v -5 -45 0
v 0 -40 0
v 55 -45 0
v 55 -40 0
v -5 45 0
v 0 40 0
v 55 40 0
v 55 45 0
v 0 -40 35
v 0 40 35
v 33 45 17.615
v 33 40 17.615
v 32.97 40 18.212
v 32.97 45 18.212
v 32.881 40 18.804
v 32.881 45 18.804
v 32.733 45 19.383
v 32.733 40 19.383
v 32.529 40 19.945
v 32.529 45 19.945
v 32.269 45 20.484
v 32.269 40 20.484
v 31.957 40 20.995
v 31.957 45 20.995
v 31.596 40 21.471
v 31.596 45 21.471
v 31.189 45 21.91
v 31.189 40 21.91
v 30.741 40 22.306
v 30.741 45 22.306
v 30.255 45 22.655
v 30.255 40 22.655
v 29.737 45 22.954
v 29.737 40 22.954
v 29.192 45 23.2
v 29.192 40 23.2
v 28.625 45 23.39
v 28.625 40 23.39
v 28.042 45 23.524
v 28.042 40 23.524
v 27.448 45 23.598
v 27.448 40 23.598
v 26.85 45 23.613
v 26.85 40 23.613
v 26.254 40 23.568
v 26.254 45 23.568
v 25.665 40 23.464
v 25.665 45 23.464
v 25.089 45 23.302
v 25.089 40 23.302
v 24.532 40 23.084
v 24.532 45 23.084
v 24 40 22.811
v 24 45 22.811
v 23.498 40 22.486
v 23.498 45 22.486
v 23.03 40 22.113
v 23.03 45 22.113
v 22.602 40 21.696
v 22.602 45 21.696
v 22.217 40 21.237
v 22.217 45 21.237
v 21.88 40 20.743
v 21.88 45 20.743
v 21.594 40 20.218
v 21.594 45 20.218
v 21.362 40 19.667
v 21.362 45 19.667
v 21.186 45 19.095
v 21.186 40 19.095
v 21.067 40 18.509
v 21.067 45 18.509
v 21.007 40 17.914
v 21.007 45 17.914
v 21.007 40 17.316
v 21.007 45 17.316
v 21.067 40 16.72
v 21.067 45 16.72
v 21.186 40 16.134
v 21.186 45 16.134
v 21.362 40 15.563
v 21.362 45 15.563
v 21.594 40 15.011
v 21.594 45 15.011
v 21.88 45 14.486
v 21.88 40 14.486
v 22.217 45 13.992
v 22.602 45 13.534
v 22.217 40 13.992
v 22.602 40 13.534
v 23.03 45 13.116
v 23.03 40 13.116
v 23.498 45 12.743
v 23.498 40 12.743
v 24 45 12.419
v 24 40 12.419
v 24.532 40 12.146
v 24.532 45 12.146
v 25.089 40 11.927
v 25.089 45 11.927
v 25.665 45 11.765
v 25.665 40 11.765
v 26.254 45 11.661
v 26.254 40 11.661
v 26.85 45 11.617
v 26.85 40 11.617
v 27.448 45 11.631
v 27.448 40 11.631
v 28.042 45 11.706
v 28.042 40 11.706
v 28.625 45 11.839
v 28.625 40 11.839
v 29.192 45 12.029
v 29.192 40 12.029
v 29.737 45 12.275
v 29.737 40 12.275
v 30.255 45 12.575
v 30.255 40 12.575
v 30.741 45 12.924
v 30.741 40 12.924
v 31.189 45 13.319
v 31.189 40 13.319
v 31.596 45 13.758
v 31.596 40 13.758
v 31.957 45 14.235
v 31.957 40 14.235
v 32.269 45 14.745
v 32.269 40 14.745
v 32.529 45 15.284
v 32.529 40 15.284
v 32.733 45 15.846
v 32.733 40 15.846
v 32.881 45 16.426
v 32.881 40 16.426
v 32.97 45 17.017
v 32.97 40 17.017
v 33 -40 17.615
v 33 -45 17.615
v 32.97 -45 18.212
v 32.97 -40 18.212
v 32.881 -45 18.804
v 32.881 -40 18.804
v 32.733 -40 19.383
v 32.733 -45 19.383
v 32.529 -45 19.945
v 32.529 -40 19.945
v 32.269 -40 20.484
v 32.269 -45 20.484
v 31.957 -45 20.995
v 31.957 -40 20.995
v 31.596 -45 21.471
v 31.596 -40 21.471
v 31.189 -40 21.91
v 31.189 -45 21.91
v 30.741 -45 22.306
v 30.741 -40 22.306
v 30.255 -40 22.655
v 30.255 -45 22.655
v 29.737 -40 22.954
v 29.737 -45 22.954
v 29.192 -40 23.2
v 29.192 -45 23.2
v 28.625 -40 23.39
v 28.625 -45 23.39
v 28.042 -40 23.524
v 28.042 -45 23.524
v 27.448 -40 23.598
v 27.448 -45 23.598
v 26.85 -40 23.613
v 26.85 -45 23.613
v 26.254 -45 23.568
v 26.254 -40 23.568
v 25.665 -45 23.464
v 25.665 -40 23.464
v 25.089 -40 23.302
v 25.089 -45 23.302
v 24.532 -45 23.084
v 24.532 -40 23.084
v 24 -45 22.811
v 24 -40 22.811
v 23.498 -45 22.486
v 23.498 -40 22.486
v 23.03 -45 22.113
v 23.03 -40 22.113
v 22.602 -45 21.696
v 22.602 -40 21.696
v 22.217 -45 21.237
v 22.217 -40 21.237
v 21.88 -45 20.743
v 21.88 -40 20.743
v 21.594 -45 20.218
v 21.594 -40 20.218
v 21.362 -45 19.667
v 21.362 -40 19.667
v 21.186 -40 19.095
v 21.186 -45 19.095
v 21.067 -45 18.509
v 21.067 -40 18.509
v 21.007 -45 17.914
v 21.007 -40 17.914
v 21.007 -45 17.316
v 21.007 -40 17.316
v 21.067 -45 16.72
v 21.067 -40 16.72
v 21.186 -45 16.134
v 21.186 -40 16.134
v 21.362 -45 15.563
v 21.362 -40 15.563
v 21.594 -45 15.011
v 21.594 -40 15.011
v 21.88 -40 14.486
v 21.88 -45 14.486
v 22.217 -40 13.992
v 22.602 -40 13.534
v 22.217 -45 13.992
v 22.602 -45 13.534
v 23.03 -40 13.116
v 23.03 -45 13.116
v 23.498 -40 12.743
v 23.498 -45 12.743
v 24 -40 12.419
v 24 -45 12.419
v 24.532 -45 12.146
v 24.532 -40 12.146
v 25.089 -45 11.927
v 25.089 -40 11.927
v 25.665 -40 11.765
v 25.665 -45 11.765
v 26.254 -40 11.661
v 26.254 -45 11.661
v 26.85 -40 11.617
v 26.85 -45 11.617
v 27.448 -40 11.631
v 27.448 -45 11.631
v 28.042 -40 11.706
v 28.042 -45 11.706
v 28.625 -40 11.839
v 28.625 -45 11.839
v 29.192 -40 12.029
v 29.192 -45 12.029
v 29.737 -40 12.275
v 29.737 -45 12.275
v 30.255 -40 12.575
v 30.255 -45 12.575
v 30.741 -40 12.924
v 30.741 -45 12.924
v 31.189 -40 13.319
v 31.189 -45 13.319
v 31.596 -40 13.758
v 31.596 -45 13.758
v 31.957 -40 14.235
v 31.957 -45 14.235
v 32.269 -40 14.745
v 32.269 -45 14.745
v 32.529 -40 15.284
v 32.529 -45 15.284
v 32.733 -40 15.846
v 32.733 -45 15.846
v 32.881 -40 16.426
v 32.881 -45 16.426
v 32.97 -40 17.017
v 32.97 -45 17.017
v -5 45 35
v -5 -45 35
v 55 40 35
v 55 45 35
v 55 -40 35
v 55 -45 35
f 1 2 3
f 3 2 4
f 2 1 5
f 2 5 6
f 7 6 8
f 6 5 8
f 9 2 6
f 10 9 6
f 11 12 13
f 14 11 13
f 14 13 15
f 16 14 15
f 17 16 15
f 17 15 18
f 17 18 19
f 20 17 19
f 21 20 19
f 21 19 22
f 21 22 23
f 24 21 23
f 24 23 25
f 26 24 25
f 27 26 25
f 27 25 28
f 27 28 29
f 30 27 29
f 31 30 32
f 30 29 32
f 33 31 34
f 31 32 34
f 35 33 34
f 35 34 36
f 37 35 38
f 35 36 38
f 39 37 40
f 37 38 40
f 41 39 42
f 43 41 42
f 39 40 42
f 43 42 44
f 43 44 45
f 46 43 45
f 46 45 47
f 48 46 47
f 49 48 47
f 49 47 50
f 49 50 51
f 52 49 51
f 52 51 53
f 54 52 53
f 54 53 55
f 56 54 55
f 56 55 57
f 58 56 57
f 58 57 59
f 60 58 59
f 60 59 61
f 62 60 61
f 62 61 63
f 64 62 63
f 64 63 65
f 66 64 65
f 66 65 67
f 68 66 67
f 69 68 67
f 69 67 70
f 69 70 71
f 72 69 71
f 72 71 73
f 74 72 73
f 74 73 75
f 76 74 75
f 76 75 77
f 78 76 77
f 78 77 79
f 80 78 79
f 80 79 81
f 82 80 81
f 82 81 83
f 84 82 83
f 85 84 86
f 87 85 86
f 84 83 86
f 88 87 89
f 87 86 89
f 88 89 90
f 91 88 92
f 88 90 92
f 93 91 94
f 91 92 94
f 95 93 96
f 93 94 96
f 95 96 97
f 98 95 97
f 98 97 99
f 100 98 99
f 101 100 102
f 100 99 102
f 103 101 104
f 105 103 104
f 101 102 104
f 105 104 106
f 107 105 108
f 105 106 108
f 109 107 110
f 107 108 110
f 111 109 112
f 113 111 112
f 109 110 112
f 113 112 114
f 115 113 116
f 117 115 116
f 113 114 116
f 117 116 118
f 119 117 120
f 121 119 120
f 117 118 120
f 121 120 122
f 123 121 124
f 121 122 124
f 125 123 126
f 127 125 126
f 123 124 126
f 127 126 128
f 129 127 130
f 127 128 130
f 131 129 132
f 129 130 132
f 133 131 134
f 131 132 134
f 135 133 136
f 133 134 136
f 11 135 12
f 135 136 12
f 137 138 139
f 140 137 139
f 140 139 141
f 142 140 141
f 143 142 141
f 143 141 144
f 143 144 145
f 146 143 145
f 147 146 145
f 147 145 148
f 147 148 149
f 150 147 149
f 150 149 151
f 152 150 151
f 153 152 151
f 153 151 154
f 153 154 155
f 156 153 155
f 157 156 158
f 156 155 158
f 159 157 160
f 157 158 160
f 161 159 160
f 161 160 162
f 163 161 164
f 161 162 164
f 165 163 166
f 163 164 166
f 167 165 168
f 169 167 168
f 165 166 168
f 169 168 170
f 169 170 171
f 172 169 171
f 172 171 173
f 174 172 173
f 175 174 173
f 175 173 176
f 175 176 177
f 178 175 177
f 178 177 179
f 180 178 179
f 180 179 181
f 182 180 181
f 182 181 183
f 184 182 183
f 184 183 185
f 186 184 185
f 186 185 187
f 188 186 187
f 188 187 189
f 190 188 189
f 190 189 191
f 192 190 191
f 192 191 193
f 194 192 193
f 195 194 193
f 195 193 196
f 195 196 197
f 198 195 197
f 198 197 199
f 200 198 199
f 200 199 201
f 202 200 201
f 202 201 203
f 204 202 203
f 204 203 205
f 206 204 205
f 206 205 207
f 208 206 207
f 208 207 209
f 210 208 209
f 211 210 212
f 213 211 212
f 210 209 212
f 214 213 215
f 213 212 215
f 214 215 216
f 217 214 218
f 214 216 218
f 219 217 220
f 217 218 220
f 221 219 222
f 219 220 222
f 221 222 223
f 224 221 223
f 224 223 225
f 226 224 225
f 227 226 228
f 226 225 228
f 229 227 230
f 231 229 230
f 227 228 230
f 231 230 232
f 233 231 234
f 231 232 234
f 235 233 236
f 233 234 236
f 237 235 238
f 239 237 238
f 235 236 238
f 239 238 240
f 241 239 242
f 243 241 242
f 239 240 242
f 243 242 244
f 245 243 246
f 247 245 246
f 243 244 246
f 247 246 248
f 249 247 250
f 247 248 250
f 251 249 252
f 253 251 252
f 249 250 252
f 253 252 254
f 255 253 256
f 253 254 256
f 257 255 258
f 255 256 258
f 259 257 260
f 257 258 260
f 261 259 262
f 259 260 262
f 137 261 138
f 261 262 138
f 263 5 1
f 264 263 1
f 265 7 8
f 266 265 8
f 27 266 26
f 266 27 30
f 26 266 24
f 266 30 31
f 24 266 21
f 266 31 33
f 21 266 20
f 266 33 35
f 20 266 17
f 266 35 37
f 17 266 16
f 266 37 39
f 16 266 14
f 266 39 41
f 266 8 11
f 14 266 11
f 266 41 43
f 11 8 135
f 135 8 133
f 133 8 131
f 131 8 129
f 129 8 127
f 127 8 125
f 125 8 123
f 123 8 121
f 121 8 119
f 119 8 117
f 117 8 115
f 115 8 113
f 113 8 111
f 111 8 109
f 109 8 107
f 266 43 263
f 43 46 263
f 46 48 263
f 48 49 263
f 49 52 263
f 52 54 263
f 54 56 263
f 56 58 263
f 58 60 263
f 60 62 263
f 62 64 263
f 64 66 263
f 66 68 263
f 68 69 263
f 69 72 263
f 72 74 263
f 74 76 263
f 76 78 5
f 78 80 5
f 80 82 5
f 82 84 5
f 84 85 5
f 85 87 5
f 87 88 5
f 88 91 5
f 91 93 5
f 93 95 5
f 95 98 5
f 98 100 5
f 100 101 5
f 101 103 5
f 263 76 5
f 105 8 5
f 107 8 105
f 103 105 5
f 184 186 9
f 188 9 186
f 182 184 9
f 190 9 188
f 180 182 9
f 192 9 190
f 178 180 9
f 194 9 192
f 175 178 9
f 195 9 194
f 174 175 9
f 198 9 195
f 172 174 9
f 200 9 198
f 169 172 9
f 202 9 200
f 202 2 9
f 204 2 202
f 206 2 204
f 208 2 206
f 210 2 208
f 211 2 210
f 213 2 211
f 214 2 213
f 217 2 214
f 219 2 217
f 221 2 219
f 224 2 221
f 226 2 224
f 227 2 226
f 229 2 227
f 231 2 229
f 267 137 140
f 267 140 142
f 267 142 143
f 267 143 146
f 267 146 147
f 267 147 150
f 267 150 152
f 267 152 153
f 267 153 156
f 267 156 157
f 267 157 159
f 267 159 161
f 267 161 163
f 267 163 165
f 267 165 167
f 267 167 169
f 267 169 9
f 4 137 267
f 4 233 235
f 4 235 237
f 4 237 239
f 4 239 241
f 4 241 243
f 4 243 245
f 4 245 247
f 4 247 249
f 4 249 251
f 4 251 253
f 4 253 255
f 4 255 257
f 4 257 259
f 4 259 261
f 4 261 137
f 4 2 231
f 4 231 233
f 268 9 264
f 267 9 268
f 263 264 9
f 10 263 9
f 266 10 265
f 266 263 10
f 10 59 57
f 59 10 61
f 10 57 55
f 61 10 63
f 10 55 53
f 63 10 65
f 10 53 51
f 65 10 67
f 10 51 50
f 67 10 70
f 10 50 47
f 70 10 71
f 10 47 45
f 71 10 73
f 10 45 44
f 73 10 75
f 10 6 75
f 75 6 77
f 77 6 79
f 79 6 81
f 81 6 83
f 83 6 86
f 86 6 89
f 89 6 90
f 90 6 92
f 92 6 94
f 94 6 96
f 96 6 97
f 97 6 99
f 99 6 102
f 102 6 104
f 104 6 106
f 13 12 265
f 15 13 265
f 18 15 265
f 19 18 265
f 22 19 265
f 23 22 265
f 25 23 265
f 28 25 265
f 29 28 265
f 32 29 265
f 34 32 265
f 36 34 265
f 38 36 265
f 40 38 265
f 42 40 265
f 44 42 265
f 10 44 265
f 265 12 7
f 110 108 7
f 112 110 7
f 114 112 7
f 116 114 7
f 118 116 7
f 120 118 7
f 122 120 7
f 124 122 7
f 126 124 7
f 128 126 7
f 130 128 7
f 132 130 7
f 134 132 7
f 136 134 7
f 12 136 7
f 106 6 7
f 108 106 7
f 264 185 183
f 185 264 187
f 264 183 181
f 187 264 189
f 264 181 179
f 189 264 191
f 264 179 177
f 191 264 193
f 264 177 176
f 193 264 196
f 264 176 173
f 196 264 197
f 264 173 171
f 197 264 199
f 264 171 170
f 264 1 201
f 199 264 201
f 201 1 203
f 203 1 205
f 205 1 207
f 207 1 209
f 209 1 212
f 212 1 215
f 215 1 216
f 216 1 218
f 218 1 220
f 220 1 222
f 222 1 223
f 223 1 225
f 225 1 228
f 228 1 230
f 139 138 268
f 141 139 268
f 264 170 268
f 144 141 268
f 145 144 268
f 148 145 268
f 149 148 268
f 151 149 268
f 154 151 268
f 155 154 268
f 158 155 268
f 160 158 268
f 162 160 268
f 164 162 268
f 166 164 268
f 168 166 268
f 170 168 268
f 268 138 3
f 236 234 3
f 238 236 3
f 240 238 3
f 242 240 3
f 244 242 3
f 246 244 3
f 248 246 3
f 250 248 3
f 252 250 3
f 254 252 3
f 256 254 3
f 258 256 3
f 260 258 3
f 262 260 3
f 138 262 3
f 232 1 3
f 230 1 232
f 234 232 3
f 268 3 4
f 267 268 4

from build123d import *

# Parameters (mm, degrees)
F0_W     = 55
F0_H     = 5
F1_DEPTH = 35
F3_D     = 12


with BuildPart() as f1:
    # F0 (on Top) → F1 (new body)
    with BuildSketch(Plane.XY):
        Polygon((0, -40), (0, 0), (-5, 0), (-5, -45), (0, -45), align=None)
        Polygon((-5, 0), (0, 0), (0, 40), (0, 45), (-5, 45), align=None)
        with Locations((27.5, 42.5)):
            Rectangle(F0_W, F0_H)
        with Locations((27.5, -42.5)):
            Rectangle(F0_W, F0_H)
    extrude(amount=F1_DEPTH)

    # F3 (through all)
    with Locations(Plane(origin=(0, 45, 0), x_dir=(-1, 0, 0), z_dir=(0, 1, 0))):
        with Locations((-27, 17.614661)):
            Hole(F3_D / 2)


solid = f1.part
